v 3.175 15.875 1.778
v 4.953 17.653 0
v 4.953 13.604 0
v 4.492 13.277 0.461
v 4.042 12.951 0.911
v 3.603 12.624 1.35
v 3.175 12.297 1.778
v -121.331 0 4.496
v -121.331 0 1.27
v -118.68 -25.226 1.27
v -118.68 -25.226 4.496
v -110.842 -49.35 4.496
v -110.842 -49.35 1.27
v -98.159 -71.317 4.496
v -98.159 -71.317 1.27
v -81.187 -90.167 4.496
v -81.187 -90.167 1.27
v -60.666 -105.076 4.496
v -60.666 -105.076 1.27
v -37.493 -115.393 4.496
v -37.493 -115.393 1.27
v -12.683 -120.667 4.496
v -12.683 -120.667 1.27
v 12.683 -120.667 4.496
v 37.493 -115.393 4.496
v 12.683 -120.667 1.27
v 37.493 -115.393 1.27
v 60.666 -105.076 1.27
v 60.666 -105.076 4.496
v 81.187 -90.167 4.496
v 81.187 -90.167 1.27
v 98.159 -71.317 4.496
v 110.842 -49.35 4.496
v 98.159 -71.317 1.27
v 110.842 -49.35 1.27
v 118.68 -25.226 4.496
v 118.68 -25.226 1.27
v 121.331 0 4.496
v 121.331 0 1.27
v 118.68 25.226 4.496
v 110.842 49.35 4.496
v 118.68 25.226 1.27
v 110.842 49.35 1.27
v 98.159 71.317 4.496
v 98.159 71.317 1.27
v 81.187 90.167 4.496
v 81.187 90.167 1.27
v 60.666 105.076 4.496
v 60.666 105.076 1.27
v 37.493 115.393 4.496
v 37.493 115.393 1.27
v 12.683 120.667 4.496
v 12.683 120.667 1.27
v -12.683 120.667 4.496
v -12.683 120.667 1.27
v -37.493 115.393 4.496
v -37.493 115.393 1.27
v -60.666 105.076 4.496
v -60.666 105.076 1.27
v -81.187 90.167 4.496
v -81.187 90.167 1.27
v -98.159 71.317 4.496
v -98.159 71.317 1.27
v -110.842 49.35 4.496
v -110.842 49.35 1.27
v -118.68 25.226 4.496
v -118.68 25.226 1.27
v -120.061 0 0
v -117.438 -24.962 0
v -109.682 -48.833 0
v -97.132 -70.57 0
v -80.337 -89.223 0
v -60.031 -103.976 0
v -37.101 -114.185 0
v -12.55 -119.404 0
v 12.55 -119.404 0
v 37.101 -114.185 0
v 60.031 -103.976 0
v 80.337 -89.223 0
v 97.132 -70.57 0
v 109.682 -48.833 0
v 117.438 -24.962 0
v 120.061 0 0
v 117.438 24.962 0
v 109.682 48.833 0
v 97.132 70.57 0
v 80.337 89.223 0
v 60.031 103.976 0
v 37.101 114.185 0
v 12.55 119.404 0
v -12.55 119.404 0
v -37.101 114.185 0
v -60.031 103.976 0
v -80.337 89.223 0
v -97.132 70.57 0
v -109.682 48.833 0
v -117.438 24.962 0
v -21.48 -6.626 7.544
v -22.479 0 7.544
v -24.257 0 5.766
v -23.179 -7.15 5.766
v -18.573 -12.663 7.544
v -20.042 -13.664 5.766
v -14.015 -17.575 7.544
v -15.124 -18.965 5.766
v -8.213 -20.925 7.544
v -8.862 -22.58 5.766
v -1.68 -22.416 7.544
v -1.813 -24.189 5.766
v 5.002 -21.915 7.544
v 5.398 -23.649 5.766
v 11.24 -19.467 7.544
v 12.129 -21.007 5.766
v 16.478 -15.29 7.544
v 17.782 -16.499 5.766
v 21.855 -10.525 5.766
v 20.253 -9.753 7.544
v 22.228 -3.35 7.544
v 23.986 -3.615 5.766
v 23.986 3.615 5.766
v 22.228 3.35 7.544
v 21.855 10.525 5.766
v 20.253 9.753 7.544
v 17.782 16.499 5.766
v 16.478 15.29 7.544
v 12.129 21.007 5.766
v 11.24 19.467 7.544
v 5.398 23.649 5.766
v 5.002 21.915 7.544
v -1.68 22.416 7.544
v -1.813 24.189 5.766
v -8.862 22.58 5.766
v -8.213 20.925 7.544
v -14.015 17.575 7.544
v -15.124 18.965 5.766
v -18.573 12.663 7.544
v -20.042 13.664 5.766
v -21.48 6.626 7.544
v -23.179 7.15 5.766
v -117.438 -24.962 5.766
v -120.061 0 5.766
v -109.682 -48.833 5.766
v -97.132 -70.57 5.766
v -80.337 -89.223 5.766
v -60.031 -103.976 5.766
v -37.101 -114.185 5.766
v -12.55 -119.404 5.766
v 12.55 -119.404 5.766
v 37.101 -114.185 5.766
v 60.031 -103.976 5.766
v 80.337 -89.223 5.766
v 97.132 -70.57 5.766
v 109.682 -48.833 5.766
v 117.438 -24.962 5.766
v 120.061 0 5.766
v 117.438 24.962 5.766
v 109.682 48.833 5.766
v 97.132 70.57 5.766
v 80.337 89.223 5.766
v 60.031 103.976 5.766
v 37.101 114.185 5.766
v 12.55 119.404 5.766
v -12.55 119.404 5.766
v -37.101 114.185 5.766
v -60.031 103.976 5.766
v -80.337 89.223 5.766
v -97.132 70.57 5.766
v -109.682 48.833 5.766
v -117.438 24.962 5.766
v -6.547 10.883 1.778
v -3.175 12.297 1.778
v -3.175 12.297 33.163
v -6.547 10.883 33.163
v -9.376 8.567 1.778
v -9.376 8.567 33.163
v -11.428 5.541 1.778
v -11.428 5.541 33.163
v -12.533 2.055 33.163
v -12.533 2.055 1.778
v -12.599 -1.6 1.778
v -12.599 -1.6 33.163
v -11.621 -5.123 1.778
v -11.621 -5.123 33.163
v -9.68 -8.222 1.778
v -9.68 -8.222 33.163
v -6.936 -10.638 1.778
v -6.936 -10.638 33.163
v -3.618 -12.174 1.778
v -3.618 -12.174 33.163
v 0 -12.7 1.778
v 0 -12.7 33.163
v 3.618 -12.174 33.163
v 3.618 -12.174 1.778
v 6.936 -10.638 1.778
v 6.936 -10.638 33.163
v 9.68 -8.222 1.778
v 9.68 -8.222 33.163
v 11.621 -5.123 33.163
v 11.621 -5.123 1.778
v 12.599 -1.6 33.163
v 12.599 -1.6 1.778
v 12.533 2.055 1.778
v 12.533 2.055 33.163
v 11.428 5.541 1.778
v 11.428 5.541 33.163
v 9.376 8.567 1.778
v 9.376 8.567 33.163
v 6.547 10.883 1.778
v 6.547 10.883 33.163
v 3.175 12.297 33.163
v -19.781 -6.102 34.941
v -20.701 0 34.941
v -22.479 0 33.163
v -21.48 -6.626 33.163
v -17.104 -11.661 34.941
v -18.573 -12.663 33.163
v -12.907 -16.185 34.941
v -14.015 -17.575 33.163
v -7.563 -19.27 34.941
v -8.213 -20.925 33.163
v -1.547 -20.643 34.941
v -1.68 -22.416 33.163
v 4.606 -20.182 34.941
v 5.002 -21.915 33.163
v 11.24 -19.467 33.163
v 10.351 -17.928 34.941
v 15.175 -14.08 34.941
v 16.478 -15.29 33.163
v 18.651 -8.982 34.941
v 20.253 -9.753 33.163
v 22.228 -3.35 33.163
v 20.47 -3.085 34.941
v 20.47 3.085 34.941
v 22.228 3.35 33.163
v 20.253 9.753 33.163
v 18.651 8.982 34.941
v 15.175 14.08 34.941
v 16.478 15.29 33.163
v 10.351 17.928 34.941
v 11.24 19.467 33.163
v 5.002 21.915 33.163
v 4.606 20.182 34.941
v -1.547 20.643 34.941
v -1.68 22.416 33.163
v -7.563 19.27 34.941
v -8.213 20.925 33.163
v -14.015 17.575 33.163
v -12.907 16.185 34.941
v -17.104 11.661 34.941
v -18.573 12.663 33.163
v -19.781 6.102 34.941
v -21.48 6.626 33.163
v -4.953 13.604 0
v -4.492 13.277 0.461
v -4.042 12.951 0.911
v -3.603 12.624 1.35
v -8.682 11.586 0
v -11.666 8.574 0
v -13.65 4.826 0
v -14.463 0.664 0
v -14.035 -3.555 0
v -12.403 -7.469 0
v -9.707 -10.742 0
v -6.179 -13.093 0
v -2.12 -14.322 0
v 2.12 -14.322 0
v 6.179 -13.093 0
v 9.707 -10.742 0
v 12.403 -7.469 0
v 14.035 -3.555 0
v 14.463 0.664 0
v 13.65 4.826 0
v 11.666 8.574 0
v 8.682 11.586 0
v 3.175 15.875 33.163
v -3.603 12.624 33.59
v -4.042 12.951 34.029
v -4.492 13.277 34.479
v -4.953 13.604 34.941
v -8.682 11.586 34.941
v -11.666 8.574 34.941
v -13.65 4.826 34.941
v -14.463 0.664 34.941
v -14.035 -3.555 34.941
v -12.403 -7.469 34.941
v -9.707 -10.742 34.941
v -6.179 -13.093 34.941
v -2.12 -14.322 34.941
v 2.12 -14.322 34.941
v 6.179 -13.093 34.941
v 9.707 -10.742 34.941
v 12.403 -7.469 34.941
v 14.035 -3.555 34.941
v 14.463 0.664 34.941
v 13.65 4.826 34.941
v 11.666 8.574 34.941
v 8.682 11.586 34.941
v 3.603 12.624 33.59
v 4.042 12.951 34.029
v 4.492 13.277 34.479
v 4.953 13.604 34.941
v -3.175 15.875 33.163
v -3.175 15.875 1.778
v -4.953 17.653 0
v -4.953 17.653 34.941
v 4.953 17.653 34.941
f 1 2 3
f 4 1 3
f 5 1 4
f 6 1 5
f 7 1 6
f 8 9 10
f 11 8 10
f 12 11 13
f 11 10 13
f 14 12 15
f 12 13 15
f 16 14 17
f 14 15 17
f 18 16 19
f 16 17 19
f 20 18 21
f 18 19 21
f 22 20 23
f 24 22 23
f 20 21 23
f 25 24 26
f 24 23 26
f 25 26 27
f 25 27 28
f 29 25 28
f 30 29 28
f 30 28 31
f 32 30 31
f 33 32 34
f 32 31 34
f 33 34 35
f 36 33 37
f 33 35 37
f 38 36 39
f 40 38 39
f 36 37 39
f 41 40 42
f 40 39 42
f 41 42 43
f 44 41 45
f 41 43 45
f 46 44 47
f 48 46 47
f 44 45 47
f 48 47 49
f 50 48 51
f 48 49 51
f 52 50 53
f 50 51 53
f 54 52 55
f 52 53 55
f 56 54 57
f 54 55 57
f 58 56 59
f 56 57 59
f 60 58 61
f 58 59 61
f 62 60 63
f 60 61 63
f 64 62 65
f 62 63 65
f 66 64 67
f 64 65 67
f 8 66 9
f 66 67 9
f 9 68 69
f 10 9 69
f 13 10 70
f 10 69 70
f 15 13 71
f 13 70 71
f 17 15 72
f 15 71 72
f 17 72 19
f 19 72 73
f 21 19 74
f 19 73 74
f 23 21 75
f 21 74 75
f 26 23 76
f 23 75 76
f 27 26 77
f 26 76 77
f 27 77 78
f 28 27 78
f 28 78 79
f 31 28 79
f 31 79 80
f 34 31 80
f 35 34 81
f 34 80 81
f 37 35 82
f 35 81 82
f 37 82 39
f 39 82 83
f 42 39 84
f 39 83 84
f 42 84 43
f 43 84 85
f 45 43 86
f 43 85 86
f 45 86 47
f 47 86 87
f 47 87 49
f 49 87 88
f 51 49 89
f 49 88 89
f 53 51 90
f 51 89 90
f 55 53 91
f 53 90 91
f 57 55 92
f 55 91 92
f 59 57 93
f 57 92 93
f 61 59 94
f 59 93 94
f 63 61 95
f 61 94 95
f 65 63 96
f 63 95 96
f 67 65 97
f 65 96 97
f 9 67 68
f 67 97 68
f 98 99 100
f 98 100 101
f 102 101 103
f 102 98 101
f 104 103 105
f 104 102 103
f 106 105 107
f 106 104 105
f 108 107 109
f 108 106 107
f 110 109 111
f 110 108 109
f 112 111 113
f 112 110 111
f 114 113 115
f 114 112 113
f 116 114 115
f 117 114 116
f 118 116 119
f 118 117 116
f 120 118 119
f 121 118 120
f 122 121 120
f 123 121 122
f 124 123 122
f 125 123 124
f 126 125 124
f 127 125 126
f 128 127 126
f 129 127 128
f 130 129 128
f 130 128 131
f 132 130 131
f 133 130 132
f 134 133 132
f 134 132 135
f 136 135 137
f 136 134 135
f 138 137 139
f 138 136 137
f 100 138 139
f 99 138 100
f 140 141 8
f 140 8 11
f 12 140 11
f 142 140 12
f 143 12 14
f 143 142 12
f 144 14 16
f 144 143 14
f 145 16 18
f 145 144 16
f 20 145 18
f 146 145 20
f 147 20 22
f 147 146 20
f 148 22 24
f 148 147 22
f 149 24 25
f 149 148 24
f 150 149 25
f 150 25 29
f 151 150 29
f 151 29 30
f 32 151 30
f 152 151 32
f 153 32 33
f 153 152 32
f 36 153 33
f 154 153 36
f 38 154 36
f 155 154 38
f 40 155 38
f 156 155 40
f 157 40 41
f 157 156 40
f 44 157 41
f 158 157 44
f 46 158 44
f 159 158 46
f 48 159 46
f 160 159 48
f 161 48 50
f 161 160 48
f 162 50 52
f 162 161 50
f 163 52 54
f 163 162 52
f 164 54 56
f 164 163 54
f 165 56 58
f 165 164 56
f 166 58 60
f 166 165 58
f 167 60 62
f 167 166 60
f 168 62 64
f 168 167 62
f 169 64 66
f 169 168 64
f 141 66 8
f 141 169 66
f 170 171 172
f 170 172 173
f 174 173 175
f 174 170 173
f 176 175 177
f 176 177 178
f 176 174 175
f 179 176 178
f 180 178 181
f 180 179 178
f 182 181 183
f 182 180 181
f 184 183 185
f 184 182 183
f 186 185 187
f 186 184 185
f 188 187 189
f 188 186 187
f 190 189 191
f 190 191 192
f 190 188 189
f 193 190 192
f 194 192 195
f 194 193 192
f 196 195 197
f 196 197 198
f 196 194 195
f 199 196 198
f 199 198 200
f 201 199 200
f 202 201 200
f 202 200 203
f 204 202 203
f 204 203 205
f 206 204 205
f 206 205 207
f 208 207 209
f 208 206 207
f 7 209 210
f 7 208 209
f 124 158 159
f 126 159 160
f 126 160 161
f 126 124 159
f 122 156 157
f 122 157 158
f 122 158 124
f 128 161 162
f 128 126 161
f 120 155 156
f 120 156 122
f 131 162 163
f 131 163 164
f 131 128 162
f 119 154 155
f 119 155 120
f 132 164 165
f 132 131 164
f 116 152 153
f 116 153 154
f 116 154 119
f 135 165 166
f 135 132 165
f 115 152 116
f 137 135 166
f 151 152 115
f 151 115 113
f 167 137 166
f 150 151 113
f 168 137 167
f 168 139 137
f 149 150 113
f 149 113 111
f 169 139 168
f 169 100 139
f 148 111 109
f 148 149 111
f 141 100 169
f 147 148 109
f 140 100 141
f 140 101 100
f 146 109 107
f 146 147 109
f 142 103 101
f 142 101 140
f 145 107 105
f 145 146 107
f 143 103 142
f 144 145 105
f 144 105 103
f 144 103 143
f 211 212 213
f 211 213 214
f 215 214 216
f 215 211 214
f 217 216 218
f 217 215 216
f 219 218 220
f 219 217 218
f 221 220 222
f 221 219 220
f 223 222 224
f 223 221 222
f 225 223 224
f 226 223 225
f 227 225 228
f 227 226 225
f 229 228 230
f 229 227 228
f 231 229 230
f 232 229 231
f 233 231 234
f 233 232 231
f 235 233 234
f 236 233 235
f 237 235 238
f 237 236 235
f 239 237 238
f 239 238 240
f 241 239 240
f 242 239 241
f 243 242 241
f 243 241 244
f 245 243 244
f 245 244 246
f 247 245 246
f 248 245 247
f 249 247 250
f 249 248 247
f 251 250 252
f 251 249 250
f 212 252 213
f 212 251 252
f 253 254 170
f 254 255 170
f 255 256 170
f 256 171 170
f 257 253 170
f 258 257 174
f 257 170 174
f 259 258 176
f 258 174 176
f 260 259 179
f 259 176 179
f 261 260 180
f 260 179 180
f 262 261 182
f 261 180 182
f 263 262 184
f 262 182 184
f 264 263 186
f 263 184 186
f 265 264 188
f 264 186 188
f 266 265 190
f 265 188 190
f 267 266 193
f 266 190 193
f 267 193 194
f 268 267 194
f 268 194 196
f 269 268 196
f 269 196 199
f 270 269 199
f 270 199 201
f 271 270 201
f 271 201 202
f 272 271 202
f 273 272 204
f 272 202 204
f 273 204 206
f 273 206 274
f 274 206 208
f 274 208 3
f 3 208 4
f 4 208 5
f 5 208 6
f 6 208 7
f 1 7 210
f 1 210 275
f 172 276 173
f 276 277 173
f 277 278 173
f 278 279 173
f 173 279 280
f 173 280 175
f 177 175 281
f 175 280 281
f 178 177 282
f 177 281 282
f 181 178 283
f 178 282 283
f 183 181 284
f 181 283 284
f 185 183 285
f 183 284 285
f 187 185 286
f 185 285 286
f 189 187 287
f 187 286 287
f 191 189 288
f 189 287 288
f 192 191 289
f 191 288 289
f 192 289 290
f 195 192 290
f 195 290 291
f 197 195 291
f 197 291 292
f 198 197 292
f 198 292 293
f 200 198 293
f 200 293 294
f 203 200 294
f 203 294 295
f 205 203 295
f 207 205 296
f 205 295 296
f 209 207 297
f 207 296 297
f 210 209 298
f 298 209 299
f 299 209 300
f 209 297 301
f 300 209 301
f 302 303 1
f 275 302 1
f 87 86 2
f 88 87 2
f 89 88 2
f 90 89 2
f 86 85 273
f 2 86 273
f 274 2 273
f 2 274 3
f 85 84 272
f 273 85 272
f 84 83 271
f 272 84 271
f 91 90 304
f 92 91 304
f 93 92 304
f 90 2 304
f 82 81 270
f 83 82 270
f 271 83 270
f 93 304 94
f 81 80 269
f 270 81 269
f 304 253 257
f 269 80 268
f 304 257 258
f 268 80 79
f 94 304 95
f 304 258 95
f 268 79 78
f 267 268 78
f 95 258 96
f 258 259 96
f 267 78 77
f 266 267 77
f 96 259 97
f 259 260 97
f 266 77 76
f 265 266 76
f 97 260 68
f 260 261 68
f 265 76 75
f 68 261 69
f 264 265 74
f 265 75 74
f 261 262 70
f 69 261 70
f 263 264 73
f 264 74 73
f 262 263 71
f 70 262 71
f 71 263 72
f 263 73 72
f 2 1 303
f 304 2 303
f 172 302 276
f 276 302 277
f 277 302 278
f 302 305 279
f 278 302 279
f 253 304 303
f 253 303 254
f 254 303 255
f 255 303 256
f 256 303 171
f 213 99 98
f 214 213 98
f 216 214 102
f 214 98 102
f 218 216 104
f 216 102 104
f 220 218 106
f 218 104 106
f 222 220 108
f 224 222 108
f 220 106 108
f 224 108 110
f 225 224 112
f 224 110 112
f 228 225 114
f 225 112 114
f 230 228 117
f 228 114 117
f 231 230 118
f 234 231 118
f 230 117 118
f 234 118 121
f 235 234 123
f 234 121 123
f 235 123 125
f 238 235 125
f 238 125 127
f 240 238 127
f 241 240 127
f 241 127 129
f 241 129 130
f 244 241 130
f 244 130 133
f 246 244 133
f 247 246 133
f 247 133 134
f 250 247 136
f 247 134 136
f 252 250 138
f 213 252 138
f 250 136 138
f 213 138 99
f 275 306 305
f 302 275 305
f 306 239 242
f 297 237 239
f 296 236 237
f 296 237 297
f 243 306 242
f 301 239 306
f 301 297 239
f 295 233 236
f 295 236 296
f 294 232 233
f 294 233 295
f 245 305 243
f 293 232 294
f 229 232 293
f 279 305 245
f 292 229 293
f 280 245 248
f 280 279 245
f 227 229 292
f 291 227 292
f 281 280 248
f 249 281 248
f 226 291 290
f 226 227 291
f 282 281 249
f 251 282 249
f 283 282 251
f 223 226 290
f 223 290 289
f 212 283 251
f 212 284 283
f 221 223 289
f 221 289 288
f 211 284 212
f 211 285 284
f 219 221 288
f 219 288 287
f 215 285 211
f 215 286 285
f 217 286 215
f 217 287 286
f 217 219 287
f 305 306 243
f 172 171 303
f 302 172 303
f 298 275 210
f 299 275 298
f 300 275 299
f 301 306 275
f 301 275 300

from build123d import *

# Parameters (mm, degrees)
SKETCH1_R               = 121.331498574
BOSS_EXTRUDE1_DEPTH     = 5.7658
SKETCH2_R               = 22.479
BOSS_EXTRUDE2_DEPTH     = 29.174948
CUT_EXTRUDE1_DEPTH      = 176.110025307
CUT_EXTRUDE1_DEPTH_BACK = 176.110025307
SKETCH3_R               = 12.7
CUT_EXTRUDE2_DEPTH      = 176.110025307
CUT_EXTRUDE2_DEPTH_BACK = 176.110025307
SKETCH4_W               = 6.35
SKETCH4_H               = 6.35
CHAMFER1_SIZE           = 1.27
CHAMFER2_SIZE           = 1.778


with BuildPart() as part:
    # Sketch1 → Boss-Extrude1 (new body)
    with BuildSketch(Plane.XY):
        with Locations(Location((0, 0, 0), (0, 0, 180))):
            Circle(SKETCH1_R)
    extrude(amount=BOSS_EXTRUDE1_DEPTH)

    # Sketch2 → Boss-Extrude2 (add)
    with BuildSketch(Plane.XY.offset(5.7658)):
        with Locations(Location((0, 0, 0), (0, 0, 180))):
            Circle(SKETCH2_R)
    extrude(amount=BOSS_EXTRUDE2_DEPTH)

    # Sketch3 → Cut-Extrude1 (cut, two sides: drawn at the far end of the back side and taken through both)
    with BuildSketch(Plane.XY.offset(34.940748).offset(-CUT_EXTRUDE1_DEPTH_BACK)):
        Circle(SKETCH3_R)
    extrude(amount=CUT_EXTRUDE1_DEPTH + CUT_EXTRUDE1_DEPTH_BACK, mode=Mode.SUBTRACT)

    # Sketch4 → Cut-Extrude2 (cut, two sides: drawn at the far end of the back side and taken through both)
    with BuildSketch(Plane.XY.offset(34.940748).offset(-CUT_EXTRUDE2_DEPTH_BACK)):
        with Locations((0, 12.7)):
            Rectangle(SKETCH4_W, SKETCH4_H)
    extrude(amount=CUT_EXTRUDE2_DEPTH + CUT_EXTRUDE2_DEPTH_BACK, mode=Mode.SUBTRACT)

    # Chamfer1
    chamfer1_edges = [part.edges().sort_by_distance(p)[0] for p in [
        (121.331498574, 0, 0),
        (121.331498574, 0, 5.7658),
    ]]
    chamfer(chamfer1_edges, length=CHAMFER1_SIZE)

    # Chamfer2
    chamfer2_edges = [part.edges().sort_by_distance(p)[0] for p in [
        (0, -12.7, 34.940748),
        (0, -12.7, 0),
        (0, 15.875, 34.940748),
        (3.175, 14.085861062, 34.940748),
        (-3.175, 14.085861062, 34.940748),
        (3.175, 14.085861062, 0),
        (-3.175, 14.085861062, 0),
        (0, 15.875, 0),
        (22.479, 0, 5.7658),
        (22.479, 0, 34.940748),
    ]]
    chamfer(chamfer2_edges, length=CHAMFER2_SIZE)


solid = part.part
